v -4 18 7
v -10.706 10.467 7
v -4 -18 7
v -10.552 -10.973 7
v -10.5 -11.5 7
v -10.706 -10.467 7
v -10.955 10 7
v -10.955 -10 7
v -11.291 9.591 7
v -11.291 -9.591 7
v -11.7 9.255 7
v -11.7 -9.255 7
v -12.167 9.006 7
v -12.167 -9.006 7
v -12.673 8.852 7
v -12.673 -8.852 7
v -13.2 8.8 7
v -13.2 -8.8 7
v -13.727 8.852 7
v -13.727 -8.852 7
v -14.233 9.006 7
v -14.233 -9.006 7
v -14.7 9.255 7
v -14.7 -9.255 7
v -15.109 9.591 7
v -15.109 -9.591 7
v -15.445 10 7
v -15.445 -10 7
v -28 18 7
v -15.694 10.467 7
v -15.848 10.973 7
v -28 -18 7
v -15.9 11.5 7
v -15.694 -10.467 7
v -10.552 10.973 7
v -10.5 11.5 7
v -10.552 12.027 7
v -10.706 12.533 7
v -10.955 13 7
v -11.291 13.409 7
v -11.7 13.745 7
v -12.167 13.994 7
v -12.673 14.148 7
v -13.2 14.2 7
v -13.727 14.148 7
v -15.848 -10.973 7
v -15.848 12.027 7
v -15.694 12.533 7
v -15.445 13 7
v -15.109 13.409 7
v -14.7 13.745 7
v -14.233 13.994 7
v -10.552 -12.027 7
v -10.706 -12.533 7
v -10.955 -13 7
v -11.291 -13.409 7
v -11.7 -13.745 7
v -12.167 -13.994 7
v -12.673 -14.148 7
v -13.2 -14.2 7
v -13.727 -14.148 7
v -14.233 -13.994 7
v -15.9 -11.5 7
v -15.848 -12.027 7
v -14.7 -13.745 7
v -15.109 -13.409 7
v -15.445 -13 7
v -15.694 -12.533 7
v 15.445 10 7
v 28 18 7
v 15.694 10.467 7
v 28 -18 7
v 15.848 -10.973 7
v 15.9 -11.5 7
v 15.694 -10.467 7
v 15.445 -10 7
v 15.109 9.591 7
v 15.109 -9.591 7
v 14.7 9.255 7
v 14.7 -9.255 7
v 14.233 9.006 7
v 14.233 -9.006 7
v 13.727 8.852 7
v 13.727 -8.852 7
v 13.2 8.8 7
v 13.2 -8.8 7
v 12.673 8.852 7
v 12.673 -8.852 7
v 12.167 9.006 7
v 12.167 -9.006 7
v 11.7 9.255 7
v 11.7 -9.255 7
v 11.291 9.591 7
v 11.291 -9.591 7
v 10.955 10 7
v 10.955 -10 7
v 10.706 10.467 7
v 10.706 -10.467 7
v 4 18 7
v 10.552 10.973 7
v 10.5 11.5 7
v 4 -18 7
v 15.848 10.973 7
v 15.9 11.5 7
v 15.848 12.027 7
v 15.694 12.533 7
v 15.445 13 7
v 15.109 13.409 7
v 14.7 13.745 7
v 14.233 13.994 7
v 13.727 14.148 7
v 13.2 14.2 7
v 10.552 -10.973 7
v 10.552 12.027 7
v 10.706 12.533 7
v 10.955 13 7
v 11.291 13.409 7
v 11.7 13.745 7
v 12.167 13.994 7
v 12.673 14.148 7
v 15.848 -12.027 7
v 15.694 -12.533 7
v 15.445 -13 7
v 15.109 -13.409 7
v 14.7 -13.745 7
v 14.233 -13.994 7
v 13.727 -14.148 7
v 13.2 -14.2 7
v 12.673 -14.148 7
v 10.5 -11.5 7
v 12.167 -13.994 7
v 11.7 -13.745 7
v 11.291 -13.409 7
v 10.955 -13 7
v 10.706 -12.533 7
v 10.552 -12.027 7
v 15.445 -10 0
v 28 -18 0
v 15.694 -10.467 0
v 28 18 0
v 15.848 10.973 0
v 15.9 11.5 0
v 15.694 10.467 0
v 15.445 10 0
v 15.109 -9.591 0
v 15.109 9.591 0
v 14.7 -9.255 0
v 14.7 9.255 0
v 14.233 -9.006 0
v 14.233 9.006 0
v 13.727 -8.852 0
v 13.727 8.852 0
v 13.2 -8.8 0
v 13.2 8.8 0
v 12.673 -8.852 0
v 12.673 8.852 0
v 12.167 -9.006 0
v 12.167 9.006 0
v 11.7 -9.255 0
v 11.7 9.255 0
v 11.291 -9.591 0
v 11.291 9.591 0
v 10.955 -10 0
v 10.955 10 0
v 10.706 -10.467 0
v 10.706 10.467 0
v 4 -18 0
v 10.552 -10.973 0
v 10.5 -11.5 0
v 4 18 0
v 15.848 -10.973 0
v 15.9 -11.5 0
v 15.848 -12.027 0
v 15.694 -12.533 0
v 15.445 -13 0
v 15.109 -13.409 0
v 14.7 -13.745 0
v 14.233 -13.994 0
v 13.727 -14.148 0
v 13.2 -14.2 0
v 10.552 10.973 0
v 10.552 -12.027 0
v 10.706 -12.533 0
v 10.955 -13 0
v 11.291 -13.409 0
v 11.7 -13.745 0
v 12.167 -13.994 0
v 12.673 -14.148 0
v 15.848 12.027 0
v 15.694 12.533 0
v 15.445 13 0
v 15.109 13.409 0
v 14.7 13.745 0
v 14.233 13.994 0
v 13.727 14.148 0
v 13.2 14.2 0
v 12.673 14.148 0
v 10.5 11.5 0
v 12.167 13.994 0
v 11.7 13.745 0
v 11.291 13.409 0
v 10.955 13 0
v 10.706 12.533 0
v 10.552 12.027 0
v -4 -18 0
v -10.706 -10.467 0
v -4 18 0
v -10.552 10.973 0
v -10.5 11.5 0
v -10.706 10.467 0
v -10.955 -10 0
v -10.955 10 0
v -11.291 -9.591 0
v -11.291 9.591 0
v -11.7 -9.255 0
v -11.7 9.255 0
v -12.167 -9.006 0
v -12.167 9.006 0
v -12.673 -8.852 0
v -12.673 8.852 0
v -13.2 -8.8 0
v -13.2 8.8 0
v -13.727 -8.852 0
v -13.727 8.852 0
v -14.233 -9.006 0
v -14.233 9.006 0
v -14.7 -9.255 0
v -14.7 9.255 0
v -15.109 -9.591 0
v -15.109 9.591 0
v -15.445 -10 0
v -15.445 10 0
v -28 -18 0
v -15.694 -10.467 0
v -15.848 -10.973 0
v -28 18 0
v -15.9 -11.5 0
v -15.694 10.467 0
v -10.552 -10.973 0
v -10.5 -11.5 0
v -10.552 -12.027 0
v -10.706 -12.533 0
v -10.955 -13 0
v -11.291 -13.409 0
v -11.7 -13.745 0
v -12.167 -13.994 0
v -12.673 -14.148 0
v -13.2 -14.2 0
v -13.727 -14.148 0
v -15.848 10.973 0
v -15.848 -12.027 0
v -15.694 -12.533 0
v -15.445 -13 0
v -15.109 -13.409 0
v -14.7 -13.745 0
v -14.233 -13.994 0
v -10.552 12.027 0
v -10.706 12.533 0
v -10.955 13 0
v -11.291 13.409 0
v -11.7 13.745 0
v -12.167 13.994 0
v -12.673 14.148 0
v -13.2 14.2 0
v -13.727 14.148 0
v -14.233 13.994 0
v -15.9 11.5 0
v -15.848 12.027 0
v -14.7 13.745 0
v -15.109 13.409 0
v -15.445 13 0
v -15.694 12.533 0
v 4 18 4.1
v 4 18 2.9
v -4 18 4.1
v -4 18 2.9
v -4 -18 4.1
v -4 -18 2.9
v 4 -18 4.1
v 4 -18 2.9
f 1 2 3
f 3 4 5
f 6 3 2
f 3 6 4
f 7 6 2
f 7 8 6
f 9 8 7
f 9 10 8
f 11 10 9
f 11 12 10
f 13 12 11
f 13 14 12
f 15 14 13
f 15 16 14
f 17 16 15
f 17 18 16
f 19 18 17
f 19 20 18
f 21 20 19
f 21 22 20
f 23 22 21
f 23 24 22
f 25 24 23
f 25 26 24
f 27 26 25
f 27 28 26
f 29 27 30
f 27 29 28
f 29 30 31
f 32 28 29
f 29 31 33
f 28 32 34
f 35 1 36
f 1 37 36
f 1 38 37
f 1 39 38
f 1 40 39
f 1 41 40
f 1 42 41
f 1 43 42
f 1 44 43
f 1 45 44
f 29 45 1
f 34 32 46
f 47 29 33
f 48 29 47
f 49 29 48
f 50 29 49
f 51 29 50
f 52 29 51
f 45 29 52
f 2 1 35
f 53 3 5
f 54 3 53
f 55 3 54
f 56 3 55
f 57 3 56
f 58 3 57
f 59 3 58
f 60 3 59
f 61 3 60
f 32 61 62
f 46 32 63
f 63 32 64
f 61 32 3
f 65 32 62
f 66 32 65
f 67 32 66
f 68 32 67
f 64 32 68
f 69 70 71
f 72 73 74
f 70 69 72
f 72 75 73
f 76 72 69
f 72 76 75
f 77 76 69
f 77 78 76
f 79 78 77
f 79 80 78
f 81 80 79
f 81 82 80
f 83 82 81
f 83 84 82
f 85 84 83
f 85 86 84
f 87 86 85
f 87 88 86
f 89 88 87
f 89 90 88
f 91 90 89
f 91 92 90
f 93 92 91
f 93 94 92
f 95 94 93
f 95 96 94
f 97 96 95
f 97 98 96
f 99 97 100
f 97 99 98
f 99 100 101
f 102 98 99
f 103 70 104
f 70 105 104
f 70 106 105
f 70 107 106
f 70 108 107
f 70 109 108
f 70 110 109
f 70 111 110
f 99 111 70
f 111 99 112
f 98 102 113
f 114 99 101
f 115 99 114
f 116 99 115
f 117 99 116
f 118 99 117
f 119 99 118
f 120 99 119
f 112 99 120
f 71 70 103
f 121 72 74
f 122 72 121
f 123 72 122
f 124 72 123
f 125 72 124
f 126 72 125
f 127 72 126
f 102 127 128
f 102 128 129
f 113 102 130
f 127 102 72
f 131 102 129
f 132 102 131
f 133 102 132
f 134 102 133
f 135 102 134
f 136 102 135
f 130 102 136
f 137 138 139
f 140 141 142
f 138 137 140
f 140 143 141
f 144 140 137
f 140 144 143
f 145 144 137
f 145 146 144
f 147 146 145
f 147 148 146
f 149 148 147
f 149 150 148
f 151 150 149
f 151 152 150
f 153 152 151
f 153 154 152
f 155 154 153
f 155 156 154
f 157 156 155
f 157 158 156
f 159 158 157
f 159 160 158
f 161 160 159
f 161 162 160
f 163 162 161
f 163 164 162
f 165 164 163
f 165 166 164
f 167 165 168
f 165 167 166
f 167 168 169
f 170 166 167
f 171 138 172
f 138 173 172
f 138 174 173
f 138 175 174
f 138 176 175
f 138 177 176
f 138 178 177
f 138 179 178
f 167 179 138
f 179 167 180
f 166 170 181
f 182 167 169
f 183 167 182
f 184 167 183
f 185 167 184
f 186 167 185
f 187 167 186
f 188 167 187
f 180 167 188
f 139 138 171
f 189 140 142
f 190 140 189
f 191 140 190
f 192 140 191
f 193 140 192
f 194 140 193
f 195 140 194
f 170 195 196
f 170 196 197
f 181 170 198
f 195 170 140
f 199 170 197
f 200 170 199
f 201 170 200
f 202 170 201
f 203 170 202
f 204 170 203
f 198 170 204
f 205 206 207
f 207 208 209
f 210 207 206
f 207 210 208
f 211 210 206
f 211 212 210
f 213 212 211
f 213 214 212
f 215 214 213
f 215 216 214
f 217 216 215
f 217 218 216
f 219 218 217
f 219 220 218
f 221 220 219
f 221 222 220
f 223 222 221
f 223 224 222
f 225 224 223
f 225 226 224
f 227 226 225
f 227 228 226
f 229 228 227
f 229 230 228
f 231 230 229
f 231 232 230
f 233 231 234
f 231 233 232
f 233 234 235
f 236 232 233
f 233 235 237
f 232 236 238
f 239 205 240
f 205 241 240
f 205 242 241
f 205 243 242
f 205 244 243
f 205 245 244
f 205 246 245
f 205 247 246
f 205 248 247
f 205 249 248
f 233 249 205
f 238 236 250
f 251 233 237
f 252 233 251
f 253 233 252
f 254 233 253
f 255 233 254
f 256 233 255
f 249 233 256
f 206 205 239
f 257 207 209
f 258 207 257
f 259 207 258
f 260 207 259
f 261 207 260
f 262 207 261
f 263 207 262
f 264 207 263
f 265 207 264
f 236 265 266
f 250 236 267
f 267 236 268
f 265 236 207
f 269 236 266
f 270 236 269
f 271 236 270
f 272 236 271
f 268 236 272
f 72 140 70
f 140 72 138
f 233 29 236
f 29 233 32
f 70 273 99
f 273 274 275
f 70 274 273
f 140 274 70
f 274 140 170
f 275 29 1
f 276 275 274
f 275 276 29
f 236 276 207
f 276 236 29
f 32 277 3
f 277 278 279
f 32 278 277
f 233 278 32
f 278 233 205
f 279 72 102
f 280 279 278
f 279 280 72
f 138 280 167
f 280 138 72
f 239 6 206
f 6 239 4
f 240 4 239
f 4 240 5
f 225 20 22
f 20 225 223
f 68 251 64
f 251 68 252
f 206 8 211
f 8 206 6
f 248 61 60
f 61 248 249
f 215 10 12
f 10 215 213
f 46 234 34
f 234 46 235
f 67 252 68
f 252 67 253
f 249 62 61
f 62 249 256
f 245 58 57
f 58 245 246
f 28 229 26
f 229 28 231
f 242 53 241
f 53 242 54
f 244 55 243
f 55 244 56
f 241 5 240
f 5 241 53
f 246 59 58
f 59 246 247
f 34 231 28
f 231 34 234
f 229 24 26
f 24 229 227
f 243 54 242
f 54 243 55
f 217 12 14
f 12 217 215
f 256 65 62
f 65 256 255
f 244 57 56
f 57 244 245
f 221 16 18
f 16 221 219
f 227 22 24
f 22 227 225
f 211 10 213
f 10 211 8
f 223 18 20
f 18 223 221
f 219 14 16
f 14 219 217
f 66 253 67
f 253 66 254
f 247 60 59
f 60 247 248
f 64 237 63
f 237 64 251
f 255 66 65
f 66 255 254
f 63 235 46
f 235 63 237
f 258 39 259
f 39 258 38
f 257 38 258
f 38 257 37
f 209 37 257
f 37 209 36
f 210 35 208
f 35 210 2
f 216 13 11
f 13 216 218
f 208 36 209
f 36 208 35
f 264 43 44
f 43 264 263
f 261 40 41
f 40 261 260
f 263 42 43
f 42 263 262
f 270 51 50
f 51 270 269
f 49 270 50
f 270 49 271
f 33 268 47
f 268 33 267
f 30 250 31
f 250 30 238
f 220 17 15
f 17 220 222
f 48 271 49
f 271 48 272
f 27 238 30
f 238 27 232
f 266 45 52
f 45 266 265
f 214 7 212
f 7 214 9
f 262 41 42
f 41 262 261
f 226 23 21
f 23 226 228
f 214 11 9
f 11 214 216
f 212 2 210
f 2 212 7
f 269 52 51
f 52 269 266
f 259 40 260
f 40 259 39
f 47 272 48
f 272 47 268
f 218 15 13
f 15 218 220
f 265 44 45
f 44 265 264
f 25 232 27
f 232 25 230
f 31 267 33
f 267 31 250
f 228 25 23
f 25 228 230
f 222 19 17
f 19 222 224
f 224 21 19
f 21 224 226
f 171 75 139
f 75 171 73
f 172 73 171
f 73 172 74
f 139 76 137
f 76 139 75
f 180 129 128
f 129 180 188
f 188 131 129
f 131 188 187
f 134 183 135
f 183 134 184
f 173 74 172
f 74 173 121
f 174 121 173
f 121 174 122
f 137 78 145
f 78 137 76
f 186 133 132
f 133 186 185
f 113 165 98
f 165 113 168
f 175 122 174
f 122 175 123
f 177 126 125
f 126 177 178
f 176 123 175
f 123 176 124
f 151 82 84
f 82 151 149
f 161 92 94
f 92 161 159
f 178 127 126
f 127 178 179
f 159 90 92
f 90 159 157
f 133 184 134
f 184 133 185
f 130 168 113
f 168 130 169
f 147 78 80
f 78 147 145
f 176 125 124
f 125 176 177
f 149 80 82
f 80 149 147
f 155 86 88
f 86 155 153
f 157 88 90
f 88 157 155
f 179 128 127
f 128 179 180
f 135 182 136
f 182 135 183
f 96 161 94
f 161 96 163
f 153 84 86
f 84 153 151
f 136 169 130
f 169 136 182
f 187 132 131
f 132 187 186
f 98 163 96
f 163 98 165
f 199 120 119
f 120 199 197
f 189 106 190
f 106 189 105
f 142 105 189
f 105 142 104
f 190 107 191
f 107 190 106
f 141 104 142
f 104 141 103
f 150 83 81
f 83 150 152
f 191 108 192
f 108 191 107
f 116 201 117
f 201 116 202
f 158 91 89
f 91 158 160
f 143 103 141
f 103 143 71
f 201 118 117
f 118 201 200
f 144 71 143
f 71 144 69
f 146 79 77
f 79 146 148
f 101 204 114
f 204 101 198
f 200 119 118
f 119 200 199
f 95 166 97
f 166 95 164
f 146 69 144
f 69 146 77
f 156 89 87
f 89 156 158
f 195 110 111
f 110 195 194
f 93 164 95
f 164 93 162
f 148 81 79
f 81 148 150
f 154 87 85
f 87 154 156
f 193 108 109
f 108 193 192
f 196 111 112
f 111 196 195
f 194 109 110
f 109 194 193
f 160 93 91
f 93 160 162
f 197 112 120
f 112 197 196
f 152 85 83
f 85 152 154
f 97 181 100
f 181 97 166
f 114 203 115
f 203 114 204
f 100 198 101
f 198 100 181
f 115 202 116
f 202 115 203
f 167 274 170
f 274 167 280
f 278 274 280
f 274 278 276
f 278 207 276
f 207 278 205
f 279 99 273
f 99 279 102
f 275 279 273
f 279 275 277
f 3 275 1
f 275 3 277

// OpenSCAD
$fn = 32;

// ----------------------------------------------------------------------
// Living hinge: 56 x 36 mm plates, 1.2 mm flexible web
// ----------------------------------------------------------------------

// --- parameters (mm) ---
plate_len = 24;           // plate length outside the web
plate_w = 36;             // plate width
thick = 7;                // plate thickness
web_half = 4;             // half width of the flex band
web_t = 1.2;              // flexible web thickness
web_z = 2.9;              // web position inside the thickness
boss_d = 9;               // screw boss diameter
boss_h = 7;               // screw boss height
boss_x = 13.2;            // screw boss distance from the web
screw_d = 5.4;            // screw hole

difference() {
  union() {
    /* one flat strip, later thinned at the middle */
    translate([-28, -18, 0]) cube([56, 36, 7]);
    /* screw bosses, sunk 0.5 mm into the plates */
    for (sx = [-13.2, 13.2]) {
      for (sy = [-11.5, 11.5]) {
        translate([sx, sy, 0]) cylinder(h = boss_h, d = boss_d);
      }
    }
  }
  /* channel from below: leaves the web on top of it */
  translate([-4, -20.5, -2.5]) cube([8, 41, 5.4]);
  /* channel from above: thins the web down to web_t */
  translate([-4, -20.5, 4.1]) cube([8, 41, 5.4]);
  /* screw holes through the bosses */
  for (sx = [-13.2, 13.2]) {
    for (sy = [-11.5, 11.5]) {
      translate([sx, sy, -2.5]) cylinder(h = boss_h + 5, d = screw_d);
    }
  }
}
